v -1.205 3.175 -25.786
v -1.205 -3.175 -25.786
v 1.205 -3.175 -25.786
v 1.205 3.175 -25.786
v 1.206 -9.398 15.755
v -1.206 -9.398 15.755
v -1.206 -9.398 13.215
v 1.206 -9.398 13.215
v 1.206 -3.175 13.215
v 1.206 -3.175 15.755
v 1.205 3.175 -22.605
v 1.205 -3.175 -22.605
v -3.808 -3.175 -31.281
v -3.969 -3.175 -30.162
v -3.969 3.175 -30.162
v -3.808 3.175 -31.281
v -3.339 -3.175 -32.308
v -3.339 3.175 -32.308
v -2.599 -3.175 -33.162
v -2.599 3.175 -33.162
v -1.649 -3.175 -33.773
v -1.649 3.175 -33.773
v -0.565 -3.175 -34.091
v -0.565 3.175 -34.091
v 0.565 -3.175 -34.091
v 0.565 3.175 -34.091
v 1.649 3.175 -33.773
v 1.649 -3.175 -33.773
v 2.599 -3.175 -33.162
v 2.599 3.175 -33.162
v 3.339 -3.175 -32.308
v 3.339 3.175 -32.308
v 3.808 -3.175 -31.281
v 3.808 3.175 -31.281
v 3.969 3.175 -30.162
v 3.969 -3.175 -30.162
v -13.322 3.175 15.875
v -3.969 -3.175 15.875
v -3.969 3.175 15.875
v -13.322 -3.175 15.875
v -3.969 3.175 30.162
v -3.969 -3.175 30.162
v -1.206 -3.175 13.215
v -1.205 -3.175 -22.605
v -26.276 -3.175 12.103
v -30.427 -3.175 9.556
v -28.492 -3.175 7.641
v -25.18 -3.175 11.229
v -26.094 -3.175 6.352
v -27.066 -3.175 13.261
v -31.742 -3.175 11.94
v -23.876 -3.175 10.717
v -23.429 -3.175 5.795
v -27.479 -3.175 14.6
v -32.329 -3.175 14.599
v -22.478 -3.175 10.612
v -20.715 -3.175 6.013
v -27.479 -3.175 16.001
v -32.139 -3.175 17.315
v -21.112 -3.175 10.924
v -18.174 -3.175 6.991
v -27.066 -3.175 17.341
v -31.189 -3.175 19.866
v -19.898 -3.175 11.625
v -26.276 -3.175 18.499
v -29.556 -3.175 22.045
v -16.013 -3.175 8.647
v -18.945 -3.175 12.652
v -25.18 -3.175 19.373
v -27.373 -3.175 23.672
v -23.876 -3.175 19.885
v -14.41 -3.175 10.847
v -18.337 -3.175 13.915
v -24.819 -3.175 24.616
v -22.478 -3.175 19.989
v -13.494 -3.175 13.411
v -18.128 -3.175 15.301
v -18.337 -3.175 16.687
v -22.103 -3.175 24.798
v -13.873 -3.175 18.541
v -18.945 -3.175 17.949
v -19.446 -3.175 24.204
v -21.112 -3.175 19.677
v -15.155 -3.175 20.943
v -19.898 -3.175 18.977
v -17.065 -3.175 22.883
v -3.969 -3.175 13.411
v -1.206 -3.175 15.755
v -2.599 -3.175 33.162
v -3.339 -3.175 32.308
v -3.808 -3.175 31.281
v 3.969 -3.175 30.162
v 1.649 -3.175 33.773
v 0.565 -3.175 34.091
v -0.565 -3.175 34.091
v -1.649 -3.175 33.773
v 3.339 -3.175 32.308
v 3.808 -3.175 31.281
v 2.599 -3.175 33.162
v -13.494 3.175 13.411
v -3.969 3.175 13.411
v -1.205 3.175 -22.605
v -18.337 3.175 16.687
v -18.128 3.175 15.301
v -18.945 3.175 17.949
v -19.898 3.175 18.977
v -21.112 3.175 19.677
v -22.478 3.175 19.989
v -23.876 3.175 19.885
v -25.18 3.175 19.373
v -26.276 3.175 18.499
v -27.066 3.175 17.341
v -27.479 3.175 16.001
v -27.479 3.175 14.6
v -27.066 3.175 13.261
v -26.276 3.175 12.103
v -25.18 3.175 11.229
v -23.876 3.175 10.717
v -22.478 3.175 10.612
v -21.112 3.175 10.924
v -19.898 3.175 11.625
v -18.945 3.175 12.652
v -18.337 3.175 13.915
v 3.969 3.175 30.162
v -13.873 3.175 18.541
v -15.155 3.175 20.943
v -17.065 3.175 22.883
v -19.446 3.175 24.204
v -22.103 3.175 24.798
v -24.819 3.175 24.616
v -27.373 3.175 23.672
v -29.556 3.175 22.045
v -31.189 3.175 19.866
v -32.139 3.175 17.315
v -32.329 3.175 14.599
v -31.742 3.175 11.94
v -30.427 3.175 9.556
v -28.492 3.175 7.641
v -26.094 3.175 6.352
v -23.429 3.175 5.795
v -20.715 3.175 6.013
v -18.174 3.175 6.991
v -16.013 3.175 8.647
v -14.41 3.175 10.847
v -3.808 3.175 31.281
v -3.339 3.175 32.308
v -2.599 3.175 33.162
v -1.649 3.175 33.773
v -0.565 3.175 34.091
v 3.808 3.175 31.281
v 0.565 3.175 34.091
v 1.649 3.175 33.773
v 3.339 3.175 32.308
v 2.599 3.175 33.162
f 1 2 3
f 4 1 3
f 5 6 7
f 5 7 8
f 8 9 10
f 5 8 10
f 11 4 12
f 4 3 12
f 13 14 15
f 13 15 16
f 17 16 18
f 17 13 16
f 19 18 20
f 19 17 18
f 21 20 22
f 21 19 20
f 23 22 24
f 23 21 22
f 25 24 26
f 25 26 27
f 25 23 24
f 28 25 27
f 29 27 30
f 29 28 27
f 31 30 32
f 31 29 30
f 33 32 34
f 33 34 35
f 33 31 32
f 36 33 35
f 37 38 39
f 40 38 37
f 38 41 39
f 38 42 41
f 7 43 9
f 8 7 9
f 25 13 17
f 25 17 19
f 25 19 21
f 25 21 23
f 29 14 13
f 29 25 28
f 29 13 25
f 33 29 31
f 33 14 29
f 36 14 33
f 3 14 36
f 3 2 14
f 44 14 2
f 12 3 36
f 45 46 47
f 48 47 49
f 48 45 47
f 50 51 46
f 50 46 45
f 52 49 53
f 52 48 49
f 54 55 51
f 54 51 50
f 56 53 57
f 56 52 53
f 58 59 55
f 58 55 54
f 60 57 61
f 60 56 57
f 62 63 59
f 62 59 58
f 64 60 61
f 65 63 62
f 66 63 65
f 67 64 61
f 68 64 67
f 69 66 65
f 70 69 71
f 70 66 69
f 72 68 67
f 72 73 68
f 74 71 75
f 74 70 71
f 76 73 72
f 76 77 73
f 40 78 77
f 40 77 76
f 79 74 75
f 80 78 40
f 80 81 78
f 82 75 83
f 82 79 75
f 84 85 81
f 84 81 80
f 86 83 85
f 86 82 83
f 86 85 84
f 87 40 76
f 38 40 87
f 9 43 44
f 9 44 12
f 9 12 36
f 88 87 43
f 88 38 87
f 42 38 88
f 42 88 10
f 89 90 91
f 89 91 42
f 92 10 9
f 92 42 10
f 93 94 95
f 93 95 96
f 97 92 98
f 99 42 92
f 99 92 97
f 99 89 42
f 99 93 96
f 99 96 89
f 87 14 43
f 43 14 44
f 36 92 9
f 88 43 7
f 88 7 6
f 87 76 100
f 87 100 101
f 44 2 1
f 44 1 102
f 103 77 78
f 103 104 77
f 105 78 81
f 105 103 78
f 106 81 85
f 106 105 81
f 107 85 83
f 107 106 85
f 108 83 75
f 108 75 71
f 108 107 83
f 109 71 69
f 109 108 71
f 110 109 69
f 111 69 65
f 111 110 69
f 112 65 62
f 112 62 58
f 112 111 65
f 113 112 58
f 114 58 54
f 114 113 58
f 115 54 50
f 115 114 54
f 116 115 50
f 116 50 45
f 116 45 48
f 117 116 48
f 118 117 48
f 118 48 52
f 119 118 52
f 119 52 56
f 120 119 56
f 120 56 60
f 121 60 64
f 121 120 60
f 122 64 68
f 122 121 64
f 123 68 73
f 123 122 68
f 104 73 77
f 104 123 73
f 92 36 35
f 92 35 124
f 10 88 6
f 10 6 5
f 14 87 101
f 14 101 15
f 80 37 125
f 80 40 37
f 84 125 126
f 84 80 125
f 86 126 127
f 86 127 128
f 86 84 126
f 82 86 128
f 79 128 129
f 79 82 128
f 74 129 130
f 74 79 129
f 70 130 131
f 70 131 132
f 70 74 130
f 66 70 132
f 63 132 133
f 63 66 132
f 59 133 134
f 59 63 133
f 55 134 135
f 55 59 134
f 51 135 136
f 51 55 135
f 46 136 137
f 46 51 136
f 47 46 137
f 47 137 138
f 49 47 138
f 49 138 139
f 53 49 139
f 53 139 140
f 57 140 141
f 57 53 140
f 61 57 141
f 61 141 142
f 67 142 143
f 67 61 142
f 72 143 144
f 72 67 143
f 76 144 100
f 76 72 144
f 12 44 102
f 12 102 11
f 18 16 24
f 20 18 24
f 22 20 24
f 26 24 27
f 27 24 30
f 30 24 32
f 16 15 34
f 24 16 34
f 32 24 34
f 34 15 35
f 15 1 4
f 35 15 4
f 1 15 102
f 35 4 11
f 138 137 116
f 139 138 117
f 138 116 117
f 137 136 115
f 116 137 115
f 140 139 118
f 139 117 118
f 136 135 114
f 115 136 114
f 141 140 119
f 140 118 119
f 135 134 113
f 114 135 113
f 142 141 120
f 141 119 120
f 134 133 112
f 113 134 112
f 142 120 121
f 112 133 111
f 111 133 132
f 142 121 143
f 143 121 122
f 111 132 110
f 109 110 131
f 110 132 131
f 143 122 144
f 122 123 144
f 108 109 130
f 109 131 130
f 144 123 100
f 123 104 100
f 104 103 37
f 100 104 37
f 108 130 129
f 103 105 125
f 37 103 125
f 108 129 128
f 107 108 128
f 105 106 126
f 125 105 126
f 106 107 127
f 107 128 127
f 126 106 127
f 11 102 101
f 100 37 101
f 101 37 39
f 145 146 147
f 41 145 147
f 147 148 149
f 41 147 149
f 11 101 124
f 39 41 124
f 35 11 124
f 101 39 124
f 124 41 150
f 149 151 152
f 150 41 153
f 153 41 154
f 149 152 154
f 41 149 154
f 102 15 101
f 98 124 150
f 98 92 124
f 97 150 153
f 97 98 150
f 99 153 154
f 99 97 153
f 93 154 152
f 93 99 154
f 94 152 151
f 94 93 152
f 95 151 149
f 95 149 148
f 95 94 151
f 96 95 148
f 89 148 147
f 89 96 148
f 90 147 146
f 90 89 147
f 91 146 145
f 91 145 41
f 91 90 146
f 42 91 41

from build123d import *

# Parameters (mm, degrees)
F0_R     = 4.7018325436
F0_W     = 2.4090255611
F0_H     = 3.1813085079
F0_W_2   = 2.413
F0_H_2   = 2.54
F1_DEPTH = 3.175
F2_DEPTH = 9.398
F3_DEPTH = 3.175


# Not quite as in the source:
# - a feature names something its author has since deleted; it is built from what else it names


with BuildPart() as f1:
    # F0 (on Front) → F1 (new body, symmetric)
    with BuildSketch(Plane.XZ):
        with BuildLine():
            ThreePointArc((-13.3044686056, 15.3006398952), (-13.3088027932, 15.5879506834), (-13.3218014117, 15.875))
            ThreePointArc((-13.3218014117, 15.875), (-32.3313565604, 15.9637766028), (-13.49375, 13.4112))
            ThreePointArc((-13.49375, 13.4112), (-13.3519070859, 14.3511912968), (-13.3044686056, 15.3006398952))
        make_face()
        with Locations((-22.8294686056, 15.3006398952)):
            Circle(F0_R, mode=Mode.SUBTRACT)
        with BuildLine():
            Line((-3.96875, 13.4112), (-3.96875, 15.875))
            Line((-3.96875, 15.875), (-13.3218014117, 15.875))
            ThreePointArc((-13.3218014117, 15.875), (-13.3088027932, 15.5879506834), (-13.3044686056, 15.3006398952))
            ThreePointArc((-13.3044686056, 15.3006398952), (-13.3519070859, 14.3511912968), (-13.49375, 13.4112))
            Line((-13.49375, 13.4112), (-3.96875, 13.4112))
        make_face()
        with BuildLine():
            Line((3.96875, -30.1625), (3.96875, 30.1625))
            ThreePointArc((3.96875, 30.1625), (0, 34.13125), (-3.96875, 30.1625))
            Line((-3.96875, 30.1625), (-3.96875, 15.875))
            Line((-3.96875, 15.875), (-3.96875, 13.4112))
            Line((-3.96875, 13.4112), (-3.96875, -30.1625))
            ThreePointArc((-3.96875, -30.1625), (0, -34.13125), (3.96875, -30.1625))
        make_face()
        with Locations((0, -24.1956412792)):
            Rectangle(F0_W, F0_H, mode=Mode.SUBTRACT)
        with Locations((0, 14.4846439362)):
            Rectangle(F0_W_2, F0_H_2, mode=Mode.SUBTRACT)
    extrude(amount=F1_DEPTH, both=True)

    # F0 (on Front) → F2 (join)
    with BuildSketch(Plane.XZ):
        with Locations((0, 14.4846439362)):
            Rectangle(F0_W_2, F0_H_2)
    extrude(amount=F2_DEPTH)

    # F0 (on Front) → F3 (join)
    with BuildSketch(Plane.XZ):
        with Locations((0, 14.4846439362)):
            Rectangle(F0_W_2, F0_H_2)
    extrude(amount=-F3_DEPTH)


solid = f1.part
